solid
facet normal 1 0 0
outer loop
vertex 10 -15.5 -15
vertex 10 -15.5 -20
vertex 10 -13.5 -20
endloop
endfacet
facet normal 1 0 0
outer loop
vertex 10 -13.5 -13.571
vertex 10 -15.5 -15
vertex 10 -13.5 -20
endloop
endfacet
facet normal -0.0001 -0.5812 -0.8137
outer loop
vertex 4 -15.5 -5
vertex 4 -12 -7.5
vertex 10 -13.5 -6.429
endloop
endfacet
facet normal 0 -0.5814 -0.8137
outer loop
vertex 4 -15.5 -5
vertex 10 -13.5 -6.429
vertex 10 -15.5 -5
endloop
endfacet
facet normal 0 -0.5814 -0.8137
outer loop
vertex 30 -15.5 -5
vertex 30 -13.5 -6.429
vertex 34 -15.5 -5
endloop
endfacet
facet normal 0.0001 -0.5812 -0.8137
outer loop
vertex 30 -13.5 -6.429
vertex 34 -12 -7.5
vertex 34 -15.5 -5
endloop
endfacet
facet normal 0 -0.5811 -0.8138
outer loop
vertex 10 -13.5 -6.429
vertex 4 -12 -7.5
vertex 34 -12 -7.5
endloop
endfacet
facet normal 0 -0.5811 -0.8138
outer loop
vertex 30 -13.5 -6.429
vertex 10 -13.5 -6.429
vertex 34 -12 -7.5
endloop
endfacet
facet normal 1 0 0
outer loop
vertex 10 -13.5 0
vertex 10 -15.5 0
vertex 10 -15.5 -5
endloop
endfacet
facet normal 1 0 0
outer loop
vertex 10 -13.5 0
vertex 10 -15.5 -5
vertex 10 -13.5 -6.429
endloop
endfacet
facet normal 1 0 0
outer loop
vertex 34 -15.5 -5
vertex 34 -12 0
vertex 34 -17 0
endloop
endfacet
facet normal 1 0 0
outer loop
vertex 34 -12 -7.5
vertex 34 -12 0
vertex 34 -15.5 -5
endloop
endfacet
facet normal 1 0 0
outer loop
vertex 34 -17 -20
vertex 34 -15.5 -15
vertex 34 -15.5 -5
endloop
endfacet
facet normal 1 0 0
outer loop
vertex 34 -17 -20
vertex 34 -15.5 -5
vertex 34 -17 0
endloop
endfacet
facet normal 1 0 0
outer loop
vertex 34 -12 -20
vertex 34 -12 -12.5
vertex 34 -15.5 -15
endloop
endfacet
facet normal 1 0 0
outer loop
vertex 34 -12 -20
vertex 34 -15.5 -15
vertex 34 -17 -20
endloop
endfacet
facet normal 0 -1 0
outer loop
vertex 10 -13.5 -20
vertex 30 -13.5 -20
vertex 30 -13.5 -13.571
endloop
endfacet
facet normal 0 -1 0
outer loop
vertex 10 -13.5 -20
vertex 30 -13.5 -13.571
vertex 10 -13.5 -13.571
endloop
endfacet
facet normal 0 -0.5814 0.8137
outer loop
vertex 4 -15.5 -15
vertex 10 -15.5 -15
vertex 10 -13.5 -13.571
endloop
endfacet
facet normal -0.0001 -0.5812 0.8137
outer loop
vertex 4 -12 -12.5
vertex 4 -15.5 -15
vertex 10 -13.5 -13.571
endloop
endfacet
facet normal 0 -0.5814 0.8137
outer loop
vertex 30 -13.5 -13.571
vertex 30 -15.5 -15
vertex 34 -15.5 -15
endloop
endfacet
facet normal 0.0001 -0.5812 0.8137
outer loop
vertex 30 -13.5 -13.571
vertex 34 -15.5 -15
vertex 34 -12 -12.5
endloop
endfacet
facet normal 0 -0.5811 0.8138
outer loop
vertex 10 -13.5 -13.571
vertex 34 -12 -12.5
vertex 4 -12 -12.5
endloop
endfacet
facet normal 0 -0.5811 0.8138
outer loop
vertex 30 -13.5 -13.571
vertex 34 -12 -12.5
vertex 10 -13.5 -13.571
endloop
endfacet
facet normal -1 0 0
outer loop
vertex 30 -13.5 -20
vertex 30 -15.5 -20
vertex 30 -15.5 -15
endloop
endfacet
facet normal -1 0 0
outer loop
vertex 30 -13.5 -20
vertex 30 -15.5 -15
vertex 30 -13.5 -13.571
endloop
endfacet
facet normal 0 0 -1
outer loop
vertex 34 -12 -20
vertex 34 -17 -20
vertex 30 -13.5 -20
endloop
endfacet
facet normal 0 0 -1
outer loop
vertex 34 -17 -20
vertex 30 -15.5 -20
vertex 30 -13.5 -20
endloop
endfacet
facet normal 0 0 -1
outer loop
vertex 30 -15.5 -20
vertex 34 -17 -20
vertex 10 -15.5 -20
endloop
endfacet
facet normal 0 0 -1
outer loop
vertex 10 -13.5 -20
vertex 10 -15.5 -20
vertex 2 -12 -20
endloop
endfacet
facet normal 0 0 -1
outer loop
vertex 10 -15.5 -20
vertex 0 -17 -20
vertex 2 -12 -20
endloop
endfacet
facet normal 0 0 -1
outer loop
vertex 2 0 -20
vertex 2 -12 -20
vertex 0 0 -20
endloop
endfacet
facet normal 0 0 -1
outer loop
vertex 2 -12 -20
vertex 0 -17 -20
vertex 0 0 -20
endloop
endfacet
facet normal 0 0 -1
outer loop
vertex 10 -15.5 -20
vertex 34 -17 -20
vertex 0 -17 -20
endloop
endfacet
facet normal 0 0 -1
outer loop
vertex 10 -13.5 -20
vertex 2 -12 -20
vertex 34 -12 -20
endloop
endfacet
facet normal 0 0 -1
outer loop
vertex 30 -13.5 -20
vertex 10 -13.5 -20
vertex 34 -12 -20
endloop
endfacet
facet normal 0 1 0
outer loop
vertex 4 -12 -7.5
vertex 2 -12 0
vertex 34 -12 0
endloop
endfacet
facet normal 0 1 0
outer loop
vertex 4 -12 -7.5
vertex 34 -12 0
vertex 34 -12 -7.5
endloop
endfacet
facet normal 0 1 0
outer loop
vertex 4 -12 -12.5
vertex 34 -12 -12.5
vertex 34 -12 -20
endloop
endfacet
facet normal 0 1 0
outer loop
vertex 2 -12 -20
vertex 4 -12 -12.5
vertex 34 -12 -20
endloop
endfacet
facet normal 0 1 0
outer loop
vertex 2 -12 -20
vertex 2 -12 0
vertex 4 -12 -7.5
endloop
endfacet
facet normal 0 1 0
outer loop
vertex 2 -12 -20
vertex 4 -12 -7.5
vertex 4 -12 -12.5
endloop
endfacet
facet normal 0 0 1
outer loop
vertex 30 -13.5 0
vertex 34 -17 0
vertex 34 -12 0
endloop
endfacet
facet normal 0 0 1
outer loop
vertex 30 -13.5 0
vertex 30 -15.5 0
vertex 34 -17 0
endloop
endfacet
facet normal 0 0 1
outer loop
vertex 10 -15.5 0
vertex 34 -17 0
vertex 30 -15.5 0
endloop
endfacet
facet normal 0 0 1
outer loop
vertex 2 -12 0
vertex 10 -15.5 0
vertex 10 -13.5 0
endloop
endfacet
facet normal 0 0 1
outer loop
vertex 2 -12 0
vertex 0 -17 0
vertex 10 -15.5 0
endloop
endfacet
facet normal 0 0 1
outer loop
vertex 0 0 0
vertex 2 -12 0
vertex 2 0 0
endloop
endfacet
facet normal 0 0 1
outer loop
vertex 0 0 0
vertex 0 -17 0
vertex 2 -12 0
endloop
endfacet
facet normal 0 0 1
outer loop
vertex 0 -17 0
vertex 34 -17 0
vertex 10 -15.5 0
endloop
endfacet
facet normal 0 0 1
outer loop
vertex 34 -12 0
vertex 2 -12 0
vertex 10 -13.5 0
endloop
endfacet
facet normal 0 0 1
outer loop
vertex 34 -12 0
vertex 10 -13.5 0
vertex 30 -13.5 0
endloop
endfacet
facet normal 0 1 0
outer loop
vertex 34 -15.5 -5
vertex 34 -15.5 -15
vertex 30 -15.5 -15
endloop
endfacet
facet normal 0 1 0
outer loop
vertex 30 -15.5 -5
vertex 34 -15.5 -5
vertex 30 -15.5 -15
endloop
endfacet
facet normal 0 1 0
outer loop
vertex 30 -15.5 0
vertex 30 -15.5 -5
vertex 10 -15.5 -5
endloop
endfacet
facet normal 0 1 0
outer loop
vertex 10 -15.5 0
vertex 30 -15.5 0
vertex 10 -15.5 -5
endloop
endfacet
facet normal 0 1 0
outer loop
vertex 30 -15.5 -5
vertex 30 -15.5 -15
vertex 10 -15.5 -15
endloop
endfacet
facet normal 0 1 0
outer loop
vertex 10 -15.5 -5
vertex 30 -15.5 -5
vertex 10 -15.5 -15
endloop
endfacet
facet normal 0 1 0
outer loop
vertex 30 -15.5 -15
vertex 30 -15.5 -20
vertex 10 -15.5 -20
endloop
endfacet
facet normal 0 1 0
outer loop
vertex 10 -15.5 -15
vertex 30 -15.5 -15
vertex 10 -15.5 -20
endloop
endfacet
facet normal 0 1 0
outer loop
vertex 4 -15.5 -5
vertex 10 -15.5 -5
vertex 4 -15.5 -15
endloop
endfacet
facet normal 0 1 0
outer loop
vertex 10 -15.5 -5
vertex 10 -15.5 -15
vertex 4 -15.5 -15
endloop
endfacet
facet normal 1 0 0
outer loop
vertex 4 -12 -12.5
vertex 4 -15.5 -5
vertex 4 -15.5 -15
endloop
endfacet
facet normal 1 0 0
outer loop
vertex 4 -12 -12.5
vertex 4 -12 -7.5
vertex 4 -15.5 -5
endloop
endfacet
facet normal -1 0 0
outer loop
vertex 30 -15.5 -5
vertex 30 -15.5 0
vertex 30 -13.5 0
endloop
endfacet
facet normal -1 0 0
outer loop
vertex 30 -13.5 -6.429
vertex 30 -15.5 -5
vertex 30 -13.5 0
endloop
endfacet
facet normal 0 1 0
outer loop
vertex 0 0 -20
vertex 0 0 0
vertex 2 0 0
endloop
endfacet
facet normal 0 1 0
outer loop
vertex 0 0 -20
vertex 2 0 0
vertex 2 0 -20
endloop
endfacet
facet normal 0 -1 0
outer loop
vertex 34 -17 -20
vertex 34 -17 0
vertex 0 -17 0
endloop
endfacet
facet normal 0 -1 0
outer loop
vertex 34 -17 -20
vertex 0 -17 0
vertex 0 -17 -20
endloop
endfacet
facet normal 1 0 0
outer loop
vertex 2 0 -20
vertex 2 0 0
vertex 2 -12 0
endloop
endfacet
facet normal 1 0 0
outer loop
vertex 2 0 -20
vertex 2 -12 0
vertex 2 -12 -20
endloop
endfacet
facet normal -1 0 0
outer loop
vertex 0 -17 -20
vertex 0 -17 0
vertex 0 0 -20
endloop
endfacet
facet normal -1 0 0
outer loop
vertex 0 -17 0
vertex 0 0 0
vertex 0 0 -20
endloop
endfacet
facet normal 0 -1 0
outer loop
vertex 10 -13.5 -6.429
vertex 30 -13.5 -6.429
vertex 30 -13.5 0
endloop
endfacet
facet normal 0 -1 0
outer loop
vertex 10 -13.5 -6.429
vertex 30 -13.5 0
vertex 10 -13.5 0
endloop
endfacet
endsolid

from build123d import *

# Parameters (mm, degrees)
SKETCH3_W                = 20
SKETCH3_H                = 12
BOSS_EXTRUDE3_DEPTH      = 2
BOSS_EXTRUDE5_DEPTH      = 32
BOSS_EXTRUDE5_DEPTH_BACK = 2
SKETCH4_W                = 20
SKETCH4_H                = 5
CUT_EXTRUDE1_DEPTH       = 30
SKETCH7_W                = 20
SKETCH7_H                = 2
CUT_EXTRUDE2_DEPTH       = 43.95346319


with BuildPart() as part:
    # Sketch3 → Boss-Extrude3 (new body)
    with BuildSketch(Plane(origin=(0, 0, 0), x_dir=(0, 0, -1), z_dir=(1, 0, 0))):
        with Locations((10, -6)):
            Rectangle(SKETCH3_W, SKETCH3_H)
    extrude(amount=BOSS_EXTRUDE3_DEPTH)

    # Sketch4 → Boss-Extrude5 (add, two sides: drawn at the far end of the back side and taken through both)
    with BuildSketch(Plane(origin=(2, 0, 0), x_dir=(0, 0, -1), z_dir=(1, 0, 0)).offset(-BOSS_EXTRUDE5_DEPTH_BACK)):
        with Locations((10, -14.5)):
            Rectangle(SKETCH4_W, SKETCH4_H)
    extrude(amount=BOSS_EXTRUDE5_DEPTH + BOSS_EXTRUDE5_DEPTH_BACK)

    # Sketch6 → Cut-Extrude1 (cut)
    with BuildSketch(Plane(origin=(34, 0, 0), x_dir=(0, 0, -1), z_dir=(1, 0, 0))):
        Polygon((5, -15.5), (15, -15.5), (12.5, -12), (7.5, -12), align=None)
    extrude(amount=-CUT_EXTRUDE1_DEPTH, mode=Mode.SUBTRACT)

    # Sketch7 → Cut-Extrude2 (cut, through all)
    with BuildSketch(Plane(origin=(0, 0, -20), x_dir=(-1, 0, 0), z_dir=(0, 0, -1))):
        with Locations((-20, -14.5)):
            Rectangle(SKETCH7_W, SKETCH7_H)
    extrude(amount=-CUT_EXTRUDE2_DEPTH, mode=Mode.SUBTRACT)


solid = part.part
